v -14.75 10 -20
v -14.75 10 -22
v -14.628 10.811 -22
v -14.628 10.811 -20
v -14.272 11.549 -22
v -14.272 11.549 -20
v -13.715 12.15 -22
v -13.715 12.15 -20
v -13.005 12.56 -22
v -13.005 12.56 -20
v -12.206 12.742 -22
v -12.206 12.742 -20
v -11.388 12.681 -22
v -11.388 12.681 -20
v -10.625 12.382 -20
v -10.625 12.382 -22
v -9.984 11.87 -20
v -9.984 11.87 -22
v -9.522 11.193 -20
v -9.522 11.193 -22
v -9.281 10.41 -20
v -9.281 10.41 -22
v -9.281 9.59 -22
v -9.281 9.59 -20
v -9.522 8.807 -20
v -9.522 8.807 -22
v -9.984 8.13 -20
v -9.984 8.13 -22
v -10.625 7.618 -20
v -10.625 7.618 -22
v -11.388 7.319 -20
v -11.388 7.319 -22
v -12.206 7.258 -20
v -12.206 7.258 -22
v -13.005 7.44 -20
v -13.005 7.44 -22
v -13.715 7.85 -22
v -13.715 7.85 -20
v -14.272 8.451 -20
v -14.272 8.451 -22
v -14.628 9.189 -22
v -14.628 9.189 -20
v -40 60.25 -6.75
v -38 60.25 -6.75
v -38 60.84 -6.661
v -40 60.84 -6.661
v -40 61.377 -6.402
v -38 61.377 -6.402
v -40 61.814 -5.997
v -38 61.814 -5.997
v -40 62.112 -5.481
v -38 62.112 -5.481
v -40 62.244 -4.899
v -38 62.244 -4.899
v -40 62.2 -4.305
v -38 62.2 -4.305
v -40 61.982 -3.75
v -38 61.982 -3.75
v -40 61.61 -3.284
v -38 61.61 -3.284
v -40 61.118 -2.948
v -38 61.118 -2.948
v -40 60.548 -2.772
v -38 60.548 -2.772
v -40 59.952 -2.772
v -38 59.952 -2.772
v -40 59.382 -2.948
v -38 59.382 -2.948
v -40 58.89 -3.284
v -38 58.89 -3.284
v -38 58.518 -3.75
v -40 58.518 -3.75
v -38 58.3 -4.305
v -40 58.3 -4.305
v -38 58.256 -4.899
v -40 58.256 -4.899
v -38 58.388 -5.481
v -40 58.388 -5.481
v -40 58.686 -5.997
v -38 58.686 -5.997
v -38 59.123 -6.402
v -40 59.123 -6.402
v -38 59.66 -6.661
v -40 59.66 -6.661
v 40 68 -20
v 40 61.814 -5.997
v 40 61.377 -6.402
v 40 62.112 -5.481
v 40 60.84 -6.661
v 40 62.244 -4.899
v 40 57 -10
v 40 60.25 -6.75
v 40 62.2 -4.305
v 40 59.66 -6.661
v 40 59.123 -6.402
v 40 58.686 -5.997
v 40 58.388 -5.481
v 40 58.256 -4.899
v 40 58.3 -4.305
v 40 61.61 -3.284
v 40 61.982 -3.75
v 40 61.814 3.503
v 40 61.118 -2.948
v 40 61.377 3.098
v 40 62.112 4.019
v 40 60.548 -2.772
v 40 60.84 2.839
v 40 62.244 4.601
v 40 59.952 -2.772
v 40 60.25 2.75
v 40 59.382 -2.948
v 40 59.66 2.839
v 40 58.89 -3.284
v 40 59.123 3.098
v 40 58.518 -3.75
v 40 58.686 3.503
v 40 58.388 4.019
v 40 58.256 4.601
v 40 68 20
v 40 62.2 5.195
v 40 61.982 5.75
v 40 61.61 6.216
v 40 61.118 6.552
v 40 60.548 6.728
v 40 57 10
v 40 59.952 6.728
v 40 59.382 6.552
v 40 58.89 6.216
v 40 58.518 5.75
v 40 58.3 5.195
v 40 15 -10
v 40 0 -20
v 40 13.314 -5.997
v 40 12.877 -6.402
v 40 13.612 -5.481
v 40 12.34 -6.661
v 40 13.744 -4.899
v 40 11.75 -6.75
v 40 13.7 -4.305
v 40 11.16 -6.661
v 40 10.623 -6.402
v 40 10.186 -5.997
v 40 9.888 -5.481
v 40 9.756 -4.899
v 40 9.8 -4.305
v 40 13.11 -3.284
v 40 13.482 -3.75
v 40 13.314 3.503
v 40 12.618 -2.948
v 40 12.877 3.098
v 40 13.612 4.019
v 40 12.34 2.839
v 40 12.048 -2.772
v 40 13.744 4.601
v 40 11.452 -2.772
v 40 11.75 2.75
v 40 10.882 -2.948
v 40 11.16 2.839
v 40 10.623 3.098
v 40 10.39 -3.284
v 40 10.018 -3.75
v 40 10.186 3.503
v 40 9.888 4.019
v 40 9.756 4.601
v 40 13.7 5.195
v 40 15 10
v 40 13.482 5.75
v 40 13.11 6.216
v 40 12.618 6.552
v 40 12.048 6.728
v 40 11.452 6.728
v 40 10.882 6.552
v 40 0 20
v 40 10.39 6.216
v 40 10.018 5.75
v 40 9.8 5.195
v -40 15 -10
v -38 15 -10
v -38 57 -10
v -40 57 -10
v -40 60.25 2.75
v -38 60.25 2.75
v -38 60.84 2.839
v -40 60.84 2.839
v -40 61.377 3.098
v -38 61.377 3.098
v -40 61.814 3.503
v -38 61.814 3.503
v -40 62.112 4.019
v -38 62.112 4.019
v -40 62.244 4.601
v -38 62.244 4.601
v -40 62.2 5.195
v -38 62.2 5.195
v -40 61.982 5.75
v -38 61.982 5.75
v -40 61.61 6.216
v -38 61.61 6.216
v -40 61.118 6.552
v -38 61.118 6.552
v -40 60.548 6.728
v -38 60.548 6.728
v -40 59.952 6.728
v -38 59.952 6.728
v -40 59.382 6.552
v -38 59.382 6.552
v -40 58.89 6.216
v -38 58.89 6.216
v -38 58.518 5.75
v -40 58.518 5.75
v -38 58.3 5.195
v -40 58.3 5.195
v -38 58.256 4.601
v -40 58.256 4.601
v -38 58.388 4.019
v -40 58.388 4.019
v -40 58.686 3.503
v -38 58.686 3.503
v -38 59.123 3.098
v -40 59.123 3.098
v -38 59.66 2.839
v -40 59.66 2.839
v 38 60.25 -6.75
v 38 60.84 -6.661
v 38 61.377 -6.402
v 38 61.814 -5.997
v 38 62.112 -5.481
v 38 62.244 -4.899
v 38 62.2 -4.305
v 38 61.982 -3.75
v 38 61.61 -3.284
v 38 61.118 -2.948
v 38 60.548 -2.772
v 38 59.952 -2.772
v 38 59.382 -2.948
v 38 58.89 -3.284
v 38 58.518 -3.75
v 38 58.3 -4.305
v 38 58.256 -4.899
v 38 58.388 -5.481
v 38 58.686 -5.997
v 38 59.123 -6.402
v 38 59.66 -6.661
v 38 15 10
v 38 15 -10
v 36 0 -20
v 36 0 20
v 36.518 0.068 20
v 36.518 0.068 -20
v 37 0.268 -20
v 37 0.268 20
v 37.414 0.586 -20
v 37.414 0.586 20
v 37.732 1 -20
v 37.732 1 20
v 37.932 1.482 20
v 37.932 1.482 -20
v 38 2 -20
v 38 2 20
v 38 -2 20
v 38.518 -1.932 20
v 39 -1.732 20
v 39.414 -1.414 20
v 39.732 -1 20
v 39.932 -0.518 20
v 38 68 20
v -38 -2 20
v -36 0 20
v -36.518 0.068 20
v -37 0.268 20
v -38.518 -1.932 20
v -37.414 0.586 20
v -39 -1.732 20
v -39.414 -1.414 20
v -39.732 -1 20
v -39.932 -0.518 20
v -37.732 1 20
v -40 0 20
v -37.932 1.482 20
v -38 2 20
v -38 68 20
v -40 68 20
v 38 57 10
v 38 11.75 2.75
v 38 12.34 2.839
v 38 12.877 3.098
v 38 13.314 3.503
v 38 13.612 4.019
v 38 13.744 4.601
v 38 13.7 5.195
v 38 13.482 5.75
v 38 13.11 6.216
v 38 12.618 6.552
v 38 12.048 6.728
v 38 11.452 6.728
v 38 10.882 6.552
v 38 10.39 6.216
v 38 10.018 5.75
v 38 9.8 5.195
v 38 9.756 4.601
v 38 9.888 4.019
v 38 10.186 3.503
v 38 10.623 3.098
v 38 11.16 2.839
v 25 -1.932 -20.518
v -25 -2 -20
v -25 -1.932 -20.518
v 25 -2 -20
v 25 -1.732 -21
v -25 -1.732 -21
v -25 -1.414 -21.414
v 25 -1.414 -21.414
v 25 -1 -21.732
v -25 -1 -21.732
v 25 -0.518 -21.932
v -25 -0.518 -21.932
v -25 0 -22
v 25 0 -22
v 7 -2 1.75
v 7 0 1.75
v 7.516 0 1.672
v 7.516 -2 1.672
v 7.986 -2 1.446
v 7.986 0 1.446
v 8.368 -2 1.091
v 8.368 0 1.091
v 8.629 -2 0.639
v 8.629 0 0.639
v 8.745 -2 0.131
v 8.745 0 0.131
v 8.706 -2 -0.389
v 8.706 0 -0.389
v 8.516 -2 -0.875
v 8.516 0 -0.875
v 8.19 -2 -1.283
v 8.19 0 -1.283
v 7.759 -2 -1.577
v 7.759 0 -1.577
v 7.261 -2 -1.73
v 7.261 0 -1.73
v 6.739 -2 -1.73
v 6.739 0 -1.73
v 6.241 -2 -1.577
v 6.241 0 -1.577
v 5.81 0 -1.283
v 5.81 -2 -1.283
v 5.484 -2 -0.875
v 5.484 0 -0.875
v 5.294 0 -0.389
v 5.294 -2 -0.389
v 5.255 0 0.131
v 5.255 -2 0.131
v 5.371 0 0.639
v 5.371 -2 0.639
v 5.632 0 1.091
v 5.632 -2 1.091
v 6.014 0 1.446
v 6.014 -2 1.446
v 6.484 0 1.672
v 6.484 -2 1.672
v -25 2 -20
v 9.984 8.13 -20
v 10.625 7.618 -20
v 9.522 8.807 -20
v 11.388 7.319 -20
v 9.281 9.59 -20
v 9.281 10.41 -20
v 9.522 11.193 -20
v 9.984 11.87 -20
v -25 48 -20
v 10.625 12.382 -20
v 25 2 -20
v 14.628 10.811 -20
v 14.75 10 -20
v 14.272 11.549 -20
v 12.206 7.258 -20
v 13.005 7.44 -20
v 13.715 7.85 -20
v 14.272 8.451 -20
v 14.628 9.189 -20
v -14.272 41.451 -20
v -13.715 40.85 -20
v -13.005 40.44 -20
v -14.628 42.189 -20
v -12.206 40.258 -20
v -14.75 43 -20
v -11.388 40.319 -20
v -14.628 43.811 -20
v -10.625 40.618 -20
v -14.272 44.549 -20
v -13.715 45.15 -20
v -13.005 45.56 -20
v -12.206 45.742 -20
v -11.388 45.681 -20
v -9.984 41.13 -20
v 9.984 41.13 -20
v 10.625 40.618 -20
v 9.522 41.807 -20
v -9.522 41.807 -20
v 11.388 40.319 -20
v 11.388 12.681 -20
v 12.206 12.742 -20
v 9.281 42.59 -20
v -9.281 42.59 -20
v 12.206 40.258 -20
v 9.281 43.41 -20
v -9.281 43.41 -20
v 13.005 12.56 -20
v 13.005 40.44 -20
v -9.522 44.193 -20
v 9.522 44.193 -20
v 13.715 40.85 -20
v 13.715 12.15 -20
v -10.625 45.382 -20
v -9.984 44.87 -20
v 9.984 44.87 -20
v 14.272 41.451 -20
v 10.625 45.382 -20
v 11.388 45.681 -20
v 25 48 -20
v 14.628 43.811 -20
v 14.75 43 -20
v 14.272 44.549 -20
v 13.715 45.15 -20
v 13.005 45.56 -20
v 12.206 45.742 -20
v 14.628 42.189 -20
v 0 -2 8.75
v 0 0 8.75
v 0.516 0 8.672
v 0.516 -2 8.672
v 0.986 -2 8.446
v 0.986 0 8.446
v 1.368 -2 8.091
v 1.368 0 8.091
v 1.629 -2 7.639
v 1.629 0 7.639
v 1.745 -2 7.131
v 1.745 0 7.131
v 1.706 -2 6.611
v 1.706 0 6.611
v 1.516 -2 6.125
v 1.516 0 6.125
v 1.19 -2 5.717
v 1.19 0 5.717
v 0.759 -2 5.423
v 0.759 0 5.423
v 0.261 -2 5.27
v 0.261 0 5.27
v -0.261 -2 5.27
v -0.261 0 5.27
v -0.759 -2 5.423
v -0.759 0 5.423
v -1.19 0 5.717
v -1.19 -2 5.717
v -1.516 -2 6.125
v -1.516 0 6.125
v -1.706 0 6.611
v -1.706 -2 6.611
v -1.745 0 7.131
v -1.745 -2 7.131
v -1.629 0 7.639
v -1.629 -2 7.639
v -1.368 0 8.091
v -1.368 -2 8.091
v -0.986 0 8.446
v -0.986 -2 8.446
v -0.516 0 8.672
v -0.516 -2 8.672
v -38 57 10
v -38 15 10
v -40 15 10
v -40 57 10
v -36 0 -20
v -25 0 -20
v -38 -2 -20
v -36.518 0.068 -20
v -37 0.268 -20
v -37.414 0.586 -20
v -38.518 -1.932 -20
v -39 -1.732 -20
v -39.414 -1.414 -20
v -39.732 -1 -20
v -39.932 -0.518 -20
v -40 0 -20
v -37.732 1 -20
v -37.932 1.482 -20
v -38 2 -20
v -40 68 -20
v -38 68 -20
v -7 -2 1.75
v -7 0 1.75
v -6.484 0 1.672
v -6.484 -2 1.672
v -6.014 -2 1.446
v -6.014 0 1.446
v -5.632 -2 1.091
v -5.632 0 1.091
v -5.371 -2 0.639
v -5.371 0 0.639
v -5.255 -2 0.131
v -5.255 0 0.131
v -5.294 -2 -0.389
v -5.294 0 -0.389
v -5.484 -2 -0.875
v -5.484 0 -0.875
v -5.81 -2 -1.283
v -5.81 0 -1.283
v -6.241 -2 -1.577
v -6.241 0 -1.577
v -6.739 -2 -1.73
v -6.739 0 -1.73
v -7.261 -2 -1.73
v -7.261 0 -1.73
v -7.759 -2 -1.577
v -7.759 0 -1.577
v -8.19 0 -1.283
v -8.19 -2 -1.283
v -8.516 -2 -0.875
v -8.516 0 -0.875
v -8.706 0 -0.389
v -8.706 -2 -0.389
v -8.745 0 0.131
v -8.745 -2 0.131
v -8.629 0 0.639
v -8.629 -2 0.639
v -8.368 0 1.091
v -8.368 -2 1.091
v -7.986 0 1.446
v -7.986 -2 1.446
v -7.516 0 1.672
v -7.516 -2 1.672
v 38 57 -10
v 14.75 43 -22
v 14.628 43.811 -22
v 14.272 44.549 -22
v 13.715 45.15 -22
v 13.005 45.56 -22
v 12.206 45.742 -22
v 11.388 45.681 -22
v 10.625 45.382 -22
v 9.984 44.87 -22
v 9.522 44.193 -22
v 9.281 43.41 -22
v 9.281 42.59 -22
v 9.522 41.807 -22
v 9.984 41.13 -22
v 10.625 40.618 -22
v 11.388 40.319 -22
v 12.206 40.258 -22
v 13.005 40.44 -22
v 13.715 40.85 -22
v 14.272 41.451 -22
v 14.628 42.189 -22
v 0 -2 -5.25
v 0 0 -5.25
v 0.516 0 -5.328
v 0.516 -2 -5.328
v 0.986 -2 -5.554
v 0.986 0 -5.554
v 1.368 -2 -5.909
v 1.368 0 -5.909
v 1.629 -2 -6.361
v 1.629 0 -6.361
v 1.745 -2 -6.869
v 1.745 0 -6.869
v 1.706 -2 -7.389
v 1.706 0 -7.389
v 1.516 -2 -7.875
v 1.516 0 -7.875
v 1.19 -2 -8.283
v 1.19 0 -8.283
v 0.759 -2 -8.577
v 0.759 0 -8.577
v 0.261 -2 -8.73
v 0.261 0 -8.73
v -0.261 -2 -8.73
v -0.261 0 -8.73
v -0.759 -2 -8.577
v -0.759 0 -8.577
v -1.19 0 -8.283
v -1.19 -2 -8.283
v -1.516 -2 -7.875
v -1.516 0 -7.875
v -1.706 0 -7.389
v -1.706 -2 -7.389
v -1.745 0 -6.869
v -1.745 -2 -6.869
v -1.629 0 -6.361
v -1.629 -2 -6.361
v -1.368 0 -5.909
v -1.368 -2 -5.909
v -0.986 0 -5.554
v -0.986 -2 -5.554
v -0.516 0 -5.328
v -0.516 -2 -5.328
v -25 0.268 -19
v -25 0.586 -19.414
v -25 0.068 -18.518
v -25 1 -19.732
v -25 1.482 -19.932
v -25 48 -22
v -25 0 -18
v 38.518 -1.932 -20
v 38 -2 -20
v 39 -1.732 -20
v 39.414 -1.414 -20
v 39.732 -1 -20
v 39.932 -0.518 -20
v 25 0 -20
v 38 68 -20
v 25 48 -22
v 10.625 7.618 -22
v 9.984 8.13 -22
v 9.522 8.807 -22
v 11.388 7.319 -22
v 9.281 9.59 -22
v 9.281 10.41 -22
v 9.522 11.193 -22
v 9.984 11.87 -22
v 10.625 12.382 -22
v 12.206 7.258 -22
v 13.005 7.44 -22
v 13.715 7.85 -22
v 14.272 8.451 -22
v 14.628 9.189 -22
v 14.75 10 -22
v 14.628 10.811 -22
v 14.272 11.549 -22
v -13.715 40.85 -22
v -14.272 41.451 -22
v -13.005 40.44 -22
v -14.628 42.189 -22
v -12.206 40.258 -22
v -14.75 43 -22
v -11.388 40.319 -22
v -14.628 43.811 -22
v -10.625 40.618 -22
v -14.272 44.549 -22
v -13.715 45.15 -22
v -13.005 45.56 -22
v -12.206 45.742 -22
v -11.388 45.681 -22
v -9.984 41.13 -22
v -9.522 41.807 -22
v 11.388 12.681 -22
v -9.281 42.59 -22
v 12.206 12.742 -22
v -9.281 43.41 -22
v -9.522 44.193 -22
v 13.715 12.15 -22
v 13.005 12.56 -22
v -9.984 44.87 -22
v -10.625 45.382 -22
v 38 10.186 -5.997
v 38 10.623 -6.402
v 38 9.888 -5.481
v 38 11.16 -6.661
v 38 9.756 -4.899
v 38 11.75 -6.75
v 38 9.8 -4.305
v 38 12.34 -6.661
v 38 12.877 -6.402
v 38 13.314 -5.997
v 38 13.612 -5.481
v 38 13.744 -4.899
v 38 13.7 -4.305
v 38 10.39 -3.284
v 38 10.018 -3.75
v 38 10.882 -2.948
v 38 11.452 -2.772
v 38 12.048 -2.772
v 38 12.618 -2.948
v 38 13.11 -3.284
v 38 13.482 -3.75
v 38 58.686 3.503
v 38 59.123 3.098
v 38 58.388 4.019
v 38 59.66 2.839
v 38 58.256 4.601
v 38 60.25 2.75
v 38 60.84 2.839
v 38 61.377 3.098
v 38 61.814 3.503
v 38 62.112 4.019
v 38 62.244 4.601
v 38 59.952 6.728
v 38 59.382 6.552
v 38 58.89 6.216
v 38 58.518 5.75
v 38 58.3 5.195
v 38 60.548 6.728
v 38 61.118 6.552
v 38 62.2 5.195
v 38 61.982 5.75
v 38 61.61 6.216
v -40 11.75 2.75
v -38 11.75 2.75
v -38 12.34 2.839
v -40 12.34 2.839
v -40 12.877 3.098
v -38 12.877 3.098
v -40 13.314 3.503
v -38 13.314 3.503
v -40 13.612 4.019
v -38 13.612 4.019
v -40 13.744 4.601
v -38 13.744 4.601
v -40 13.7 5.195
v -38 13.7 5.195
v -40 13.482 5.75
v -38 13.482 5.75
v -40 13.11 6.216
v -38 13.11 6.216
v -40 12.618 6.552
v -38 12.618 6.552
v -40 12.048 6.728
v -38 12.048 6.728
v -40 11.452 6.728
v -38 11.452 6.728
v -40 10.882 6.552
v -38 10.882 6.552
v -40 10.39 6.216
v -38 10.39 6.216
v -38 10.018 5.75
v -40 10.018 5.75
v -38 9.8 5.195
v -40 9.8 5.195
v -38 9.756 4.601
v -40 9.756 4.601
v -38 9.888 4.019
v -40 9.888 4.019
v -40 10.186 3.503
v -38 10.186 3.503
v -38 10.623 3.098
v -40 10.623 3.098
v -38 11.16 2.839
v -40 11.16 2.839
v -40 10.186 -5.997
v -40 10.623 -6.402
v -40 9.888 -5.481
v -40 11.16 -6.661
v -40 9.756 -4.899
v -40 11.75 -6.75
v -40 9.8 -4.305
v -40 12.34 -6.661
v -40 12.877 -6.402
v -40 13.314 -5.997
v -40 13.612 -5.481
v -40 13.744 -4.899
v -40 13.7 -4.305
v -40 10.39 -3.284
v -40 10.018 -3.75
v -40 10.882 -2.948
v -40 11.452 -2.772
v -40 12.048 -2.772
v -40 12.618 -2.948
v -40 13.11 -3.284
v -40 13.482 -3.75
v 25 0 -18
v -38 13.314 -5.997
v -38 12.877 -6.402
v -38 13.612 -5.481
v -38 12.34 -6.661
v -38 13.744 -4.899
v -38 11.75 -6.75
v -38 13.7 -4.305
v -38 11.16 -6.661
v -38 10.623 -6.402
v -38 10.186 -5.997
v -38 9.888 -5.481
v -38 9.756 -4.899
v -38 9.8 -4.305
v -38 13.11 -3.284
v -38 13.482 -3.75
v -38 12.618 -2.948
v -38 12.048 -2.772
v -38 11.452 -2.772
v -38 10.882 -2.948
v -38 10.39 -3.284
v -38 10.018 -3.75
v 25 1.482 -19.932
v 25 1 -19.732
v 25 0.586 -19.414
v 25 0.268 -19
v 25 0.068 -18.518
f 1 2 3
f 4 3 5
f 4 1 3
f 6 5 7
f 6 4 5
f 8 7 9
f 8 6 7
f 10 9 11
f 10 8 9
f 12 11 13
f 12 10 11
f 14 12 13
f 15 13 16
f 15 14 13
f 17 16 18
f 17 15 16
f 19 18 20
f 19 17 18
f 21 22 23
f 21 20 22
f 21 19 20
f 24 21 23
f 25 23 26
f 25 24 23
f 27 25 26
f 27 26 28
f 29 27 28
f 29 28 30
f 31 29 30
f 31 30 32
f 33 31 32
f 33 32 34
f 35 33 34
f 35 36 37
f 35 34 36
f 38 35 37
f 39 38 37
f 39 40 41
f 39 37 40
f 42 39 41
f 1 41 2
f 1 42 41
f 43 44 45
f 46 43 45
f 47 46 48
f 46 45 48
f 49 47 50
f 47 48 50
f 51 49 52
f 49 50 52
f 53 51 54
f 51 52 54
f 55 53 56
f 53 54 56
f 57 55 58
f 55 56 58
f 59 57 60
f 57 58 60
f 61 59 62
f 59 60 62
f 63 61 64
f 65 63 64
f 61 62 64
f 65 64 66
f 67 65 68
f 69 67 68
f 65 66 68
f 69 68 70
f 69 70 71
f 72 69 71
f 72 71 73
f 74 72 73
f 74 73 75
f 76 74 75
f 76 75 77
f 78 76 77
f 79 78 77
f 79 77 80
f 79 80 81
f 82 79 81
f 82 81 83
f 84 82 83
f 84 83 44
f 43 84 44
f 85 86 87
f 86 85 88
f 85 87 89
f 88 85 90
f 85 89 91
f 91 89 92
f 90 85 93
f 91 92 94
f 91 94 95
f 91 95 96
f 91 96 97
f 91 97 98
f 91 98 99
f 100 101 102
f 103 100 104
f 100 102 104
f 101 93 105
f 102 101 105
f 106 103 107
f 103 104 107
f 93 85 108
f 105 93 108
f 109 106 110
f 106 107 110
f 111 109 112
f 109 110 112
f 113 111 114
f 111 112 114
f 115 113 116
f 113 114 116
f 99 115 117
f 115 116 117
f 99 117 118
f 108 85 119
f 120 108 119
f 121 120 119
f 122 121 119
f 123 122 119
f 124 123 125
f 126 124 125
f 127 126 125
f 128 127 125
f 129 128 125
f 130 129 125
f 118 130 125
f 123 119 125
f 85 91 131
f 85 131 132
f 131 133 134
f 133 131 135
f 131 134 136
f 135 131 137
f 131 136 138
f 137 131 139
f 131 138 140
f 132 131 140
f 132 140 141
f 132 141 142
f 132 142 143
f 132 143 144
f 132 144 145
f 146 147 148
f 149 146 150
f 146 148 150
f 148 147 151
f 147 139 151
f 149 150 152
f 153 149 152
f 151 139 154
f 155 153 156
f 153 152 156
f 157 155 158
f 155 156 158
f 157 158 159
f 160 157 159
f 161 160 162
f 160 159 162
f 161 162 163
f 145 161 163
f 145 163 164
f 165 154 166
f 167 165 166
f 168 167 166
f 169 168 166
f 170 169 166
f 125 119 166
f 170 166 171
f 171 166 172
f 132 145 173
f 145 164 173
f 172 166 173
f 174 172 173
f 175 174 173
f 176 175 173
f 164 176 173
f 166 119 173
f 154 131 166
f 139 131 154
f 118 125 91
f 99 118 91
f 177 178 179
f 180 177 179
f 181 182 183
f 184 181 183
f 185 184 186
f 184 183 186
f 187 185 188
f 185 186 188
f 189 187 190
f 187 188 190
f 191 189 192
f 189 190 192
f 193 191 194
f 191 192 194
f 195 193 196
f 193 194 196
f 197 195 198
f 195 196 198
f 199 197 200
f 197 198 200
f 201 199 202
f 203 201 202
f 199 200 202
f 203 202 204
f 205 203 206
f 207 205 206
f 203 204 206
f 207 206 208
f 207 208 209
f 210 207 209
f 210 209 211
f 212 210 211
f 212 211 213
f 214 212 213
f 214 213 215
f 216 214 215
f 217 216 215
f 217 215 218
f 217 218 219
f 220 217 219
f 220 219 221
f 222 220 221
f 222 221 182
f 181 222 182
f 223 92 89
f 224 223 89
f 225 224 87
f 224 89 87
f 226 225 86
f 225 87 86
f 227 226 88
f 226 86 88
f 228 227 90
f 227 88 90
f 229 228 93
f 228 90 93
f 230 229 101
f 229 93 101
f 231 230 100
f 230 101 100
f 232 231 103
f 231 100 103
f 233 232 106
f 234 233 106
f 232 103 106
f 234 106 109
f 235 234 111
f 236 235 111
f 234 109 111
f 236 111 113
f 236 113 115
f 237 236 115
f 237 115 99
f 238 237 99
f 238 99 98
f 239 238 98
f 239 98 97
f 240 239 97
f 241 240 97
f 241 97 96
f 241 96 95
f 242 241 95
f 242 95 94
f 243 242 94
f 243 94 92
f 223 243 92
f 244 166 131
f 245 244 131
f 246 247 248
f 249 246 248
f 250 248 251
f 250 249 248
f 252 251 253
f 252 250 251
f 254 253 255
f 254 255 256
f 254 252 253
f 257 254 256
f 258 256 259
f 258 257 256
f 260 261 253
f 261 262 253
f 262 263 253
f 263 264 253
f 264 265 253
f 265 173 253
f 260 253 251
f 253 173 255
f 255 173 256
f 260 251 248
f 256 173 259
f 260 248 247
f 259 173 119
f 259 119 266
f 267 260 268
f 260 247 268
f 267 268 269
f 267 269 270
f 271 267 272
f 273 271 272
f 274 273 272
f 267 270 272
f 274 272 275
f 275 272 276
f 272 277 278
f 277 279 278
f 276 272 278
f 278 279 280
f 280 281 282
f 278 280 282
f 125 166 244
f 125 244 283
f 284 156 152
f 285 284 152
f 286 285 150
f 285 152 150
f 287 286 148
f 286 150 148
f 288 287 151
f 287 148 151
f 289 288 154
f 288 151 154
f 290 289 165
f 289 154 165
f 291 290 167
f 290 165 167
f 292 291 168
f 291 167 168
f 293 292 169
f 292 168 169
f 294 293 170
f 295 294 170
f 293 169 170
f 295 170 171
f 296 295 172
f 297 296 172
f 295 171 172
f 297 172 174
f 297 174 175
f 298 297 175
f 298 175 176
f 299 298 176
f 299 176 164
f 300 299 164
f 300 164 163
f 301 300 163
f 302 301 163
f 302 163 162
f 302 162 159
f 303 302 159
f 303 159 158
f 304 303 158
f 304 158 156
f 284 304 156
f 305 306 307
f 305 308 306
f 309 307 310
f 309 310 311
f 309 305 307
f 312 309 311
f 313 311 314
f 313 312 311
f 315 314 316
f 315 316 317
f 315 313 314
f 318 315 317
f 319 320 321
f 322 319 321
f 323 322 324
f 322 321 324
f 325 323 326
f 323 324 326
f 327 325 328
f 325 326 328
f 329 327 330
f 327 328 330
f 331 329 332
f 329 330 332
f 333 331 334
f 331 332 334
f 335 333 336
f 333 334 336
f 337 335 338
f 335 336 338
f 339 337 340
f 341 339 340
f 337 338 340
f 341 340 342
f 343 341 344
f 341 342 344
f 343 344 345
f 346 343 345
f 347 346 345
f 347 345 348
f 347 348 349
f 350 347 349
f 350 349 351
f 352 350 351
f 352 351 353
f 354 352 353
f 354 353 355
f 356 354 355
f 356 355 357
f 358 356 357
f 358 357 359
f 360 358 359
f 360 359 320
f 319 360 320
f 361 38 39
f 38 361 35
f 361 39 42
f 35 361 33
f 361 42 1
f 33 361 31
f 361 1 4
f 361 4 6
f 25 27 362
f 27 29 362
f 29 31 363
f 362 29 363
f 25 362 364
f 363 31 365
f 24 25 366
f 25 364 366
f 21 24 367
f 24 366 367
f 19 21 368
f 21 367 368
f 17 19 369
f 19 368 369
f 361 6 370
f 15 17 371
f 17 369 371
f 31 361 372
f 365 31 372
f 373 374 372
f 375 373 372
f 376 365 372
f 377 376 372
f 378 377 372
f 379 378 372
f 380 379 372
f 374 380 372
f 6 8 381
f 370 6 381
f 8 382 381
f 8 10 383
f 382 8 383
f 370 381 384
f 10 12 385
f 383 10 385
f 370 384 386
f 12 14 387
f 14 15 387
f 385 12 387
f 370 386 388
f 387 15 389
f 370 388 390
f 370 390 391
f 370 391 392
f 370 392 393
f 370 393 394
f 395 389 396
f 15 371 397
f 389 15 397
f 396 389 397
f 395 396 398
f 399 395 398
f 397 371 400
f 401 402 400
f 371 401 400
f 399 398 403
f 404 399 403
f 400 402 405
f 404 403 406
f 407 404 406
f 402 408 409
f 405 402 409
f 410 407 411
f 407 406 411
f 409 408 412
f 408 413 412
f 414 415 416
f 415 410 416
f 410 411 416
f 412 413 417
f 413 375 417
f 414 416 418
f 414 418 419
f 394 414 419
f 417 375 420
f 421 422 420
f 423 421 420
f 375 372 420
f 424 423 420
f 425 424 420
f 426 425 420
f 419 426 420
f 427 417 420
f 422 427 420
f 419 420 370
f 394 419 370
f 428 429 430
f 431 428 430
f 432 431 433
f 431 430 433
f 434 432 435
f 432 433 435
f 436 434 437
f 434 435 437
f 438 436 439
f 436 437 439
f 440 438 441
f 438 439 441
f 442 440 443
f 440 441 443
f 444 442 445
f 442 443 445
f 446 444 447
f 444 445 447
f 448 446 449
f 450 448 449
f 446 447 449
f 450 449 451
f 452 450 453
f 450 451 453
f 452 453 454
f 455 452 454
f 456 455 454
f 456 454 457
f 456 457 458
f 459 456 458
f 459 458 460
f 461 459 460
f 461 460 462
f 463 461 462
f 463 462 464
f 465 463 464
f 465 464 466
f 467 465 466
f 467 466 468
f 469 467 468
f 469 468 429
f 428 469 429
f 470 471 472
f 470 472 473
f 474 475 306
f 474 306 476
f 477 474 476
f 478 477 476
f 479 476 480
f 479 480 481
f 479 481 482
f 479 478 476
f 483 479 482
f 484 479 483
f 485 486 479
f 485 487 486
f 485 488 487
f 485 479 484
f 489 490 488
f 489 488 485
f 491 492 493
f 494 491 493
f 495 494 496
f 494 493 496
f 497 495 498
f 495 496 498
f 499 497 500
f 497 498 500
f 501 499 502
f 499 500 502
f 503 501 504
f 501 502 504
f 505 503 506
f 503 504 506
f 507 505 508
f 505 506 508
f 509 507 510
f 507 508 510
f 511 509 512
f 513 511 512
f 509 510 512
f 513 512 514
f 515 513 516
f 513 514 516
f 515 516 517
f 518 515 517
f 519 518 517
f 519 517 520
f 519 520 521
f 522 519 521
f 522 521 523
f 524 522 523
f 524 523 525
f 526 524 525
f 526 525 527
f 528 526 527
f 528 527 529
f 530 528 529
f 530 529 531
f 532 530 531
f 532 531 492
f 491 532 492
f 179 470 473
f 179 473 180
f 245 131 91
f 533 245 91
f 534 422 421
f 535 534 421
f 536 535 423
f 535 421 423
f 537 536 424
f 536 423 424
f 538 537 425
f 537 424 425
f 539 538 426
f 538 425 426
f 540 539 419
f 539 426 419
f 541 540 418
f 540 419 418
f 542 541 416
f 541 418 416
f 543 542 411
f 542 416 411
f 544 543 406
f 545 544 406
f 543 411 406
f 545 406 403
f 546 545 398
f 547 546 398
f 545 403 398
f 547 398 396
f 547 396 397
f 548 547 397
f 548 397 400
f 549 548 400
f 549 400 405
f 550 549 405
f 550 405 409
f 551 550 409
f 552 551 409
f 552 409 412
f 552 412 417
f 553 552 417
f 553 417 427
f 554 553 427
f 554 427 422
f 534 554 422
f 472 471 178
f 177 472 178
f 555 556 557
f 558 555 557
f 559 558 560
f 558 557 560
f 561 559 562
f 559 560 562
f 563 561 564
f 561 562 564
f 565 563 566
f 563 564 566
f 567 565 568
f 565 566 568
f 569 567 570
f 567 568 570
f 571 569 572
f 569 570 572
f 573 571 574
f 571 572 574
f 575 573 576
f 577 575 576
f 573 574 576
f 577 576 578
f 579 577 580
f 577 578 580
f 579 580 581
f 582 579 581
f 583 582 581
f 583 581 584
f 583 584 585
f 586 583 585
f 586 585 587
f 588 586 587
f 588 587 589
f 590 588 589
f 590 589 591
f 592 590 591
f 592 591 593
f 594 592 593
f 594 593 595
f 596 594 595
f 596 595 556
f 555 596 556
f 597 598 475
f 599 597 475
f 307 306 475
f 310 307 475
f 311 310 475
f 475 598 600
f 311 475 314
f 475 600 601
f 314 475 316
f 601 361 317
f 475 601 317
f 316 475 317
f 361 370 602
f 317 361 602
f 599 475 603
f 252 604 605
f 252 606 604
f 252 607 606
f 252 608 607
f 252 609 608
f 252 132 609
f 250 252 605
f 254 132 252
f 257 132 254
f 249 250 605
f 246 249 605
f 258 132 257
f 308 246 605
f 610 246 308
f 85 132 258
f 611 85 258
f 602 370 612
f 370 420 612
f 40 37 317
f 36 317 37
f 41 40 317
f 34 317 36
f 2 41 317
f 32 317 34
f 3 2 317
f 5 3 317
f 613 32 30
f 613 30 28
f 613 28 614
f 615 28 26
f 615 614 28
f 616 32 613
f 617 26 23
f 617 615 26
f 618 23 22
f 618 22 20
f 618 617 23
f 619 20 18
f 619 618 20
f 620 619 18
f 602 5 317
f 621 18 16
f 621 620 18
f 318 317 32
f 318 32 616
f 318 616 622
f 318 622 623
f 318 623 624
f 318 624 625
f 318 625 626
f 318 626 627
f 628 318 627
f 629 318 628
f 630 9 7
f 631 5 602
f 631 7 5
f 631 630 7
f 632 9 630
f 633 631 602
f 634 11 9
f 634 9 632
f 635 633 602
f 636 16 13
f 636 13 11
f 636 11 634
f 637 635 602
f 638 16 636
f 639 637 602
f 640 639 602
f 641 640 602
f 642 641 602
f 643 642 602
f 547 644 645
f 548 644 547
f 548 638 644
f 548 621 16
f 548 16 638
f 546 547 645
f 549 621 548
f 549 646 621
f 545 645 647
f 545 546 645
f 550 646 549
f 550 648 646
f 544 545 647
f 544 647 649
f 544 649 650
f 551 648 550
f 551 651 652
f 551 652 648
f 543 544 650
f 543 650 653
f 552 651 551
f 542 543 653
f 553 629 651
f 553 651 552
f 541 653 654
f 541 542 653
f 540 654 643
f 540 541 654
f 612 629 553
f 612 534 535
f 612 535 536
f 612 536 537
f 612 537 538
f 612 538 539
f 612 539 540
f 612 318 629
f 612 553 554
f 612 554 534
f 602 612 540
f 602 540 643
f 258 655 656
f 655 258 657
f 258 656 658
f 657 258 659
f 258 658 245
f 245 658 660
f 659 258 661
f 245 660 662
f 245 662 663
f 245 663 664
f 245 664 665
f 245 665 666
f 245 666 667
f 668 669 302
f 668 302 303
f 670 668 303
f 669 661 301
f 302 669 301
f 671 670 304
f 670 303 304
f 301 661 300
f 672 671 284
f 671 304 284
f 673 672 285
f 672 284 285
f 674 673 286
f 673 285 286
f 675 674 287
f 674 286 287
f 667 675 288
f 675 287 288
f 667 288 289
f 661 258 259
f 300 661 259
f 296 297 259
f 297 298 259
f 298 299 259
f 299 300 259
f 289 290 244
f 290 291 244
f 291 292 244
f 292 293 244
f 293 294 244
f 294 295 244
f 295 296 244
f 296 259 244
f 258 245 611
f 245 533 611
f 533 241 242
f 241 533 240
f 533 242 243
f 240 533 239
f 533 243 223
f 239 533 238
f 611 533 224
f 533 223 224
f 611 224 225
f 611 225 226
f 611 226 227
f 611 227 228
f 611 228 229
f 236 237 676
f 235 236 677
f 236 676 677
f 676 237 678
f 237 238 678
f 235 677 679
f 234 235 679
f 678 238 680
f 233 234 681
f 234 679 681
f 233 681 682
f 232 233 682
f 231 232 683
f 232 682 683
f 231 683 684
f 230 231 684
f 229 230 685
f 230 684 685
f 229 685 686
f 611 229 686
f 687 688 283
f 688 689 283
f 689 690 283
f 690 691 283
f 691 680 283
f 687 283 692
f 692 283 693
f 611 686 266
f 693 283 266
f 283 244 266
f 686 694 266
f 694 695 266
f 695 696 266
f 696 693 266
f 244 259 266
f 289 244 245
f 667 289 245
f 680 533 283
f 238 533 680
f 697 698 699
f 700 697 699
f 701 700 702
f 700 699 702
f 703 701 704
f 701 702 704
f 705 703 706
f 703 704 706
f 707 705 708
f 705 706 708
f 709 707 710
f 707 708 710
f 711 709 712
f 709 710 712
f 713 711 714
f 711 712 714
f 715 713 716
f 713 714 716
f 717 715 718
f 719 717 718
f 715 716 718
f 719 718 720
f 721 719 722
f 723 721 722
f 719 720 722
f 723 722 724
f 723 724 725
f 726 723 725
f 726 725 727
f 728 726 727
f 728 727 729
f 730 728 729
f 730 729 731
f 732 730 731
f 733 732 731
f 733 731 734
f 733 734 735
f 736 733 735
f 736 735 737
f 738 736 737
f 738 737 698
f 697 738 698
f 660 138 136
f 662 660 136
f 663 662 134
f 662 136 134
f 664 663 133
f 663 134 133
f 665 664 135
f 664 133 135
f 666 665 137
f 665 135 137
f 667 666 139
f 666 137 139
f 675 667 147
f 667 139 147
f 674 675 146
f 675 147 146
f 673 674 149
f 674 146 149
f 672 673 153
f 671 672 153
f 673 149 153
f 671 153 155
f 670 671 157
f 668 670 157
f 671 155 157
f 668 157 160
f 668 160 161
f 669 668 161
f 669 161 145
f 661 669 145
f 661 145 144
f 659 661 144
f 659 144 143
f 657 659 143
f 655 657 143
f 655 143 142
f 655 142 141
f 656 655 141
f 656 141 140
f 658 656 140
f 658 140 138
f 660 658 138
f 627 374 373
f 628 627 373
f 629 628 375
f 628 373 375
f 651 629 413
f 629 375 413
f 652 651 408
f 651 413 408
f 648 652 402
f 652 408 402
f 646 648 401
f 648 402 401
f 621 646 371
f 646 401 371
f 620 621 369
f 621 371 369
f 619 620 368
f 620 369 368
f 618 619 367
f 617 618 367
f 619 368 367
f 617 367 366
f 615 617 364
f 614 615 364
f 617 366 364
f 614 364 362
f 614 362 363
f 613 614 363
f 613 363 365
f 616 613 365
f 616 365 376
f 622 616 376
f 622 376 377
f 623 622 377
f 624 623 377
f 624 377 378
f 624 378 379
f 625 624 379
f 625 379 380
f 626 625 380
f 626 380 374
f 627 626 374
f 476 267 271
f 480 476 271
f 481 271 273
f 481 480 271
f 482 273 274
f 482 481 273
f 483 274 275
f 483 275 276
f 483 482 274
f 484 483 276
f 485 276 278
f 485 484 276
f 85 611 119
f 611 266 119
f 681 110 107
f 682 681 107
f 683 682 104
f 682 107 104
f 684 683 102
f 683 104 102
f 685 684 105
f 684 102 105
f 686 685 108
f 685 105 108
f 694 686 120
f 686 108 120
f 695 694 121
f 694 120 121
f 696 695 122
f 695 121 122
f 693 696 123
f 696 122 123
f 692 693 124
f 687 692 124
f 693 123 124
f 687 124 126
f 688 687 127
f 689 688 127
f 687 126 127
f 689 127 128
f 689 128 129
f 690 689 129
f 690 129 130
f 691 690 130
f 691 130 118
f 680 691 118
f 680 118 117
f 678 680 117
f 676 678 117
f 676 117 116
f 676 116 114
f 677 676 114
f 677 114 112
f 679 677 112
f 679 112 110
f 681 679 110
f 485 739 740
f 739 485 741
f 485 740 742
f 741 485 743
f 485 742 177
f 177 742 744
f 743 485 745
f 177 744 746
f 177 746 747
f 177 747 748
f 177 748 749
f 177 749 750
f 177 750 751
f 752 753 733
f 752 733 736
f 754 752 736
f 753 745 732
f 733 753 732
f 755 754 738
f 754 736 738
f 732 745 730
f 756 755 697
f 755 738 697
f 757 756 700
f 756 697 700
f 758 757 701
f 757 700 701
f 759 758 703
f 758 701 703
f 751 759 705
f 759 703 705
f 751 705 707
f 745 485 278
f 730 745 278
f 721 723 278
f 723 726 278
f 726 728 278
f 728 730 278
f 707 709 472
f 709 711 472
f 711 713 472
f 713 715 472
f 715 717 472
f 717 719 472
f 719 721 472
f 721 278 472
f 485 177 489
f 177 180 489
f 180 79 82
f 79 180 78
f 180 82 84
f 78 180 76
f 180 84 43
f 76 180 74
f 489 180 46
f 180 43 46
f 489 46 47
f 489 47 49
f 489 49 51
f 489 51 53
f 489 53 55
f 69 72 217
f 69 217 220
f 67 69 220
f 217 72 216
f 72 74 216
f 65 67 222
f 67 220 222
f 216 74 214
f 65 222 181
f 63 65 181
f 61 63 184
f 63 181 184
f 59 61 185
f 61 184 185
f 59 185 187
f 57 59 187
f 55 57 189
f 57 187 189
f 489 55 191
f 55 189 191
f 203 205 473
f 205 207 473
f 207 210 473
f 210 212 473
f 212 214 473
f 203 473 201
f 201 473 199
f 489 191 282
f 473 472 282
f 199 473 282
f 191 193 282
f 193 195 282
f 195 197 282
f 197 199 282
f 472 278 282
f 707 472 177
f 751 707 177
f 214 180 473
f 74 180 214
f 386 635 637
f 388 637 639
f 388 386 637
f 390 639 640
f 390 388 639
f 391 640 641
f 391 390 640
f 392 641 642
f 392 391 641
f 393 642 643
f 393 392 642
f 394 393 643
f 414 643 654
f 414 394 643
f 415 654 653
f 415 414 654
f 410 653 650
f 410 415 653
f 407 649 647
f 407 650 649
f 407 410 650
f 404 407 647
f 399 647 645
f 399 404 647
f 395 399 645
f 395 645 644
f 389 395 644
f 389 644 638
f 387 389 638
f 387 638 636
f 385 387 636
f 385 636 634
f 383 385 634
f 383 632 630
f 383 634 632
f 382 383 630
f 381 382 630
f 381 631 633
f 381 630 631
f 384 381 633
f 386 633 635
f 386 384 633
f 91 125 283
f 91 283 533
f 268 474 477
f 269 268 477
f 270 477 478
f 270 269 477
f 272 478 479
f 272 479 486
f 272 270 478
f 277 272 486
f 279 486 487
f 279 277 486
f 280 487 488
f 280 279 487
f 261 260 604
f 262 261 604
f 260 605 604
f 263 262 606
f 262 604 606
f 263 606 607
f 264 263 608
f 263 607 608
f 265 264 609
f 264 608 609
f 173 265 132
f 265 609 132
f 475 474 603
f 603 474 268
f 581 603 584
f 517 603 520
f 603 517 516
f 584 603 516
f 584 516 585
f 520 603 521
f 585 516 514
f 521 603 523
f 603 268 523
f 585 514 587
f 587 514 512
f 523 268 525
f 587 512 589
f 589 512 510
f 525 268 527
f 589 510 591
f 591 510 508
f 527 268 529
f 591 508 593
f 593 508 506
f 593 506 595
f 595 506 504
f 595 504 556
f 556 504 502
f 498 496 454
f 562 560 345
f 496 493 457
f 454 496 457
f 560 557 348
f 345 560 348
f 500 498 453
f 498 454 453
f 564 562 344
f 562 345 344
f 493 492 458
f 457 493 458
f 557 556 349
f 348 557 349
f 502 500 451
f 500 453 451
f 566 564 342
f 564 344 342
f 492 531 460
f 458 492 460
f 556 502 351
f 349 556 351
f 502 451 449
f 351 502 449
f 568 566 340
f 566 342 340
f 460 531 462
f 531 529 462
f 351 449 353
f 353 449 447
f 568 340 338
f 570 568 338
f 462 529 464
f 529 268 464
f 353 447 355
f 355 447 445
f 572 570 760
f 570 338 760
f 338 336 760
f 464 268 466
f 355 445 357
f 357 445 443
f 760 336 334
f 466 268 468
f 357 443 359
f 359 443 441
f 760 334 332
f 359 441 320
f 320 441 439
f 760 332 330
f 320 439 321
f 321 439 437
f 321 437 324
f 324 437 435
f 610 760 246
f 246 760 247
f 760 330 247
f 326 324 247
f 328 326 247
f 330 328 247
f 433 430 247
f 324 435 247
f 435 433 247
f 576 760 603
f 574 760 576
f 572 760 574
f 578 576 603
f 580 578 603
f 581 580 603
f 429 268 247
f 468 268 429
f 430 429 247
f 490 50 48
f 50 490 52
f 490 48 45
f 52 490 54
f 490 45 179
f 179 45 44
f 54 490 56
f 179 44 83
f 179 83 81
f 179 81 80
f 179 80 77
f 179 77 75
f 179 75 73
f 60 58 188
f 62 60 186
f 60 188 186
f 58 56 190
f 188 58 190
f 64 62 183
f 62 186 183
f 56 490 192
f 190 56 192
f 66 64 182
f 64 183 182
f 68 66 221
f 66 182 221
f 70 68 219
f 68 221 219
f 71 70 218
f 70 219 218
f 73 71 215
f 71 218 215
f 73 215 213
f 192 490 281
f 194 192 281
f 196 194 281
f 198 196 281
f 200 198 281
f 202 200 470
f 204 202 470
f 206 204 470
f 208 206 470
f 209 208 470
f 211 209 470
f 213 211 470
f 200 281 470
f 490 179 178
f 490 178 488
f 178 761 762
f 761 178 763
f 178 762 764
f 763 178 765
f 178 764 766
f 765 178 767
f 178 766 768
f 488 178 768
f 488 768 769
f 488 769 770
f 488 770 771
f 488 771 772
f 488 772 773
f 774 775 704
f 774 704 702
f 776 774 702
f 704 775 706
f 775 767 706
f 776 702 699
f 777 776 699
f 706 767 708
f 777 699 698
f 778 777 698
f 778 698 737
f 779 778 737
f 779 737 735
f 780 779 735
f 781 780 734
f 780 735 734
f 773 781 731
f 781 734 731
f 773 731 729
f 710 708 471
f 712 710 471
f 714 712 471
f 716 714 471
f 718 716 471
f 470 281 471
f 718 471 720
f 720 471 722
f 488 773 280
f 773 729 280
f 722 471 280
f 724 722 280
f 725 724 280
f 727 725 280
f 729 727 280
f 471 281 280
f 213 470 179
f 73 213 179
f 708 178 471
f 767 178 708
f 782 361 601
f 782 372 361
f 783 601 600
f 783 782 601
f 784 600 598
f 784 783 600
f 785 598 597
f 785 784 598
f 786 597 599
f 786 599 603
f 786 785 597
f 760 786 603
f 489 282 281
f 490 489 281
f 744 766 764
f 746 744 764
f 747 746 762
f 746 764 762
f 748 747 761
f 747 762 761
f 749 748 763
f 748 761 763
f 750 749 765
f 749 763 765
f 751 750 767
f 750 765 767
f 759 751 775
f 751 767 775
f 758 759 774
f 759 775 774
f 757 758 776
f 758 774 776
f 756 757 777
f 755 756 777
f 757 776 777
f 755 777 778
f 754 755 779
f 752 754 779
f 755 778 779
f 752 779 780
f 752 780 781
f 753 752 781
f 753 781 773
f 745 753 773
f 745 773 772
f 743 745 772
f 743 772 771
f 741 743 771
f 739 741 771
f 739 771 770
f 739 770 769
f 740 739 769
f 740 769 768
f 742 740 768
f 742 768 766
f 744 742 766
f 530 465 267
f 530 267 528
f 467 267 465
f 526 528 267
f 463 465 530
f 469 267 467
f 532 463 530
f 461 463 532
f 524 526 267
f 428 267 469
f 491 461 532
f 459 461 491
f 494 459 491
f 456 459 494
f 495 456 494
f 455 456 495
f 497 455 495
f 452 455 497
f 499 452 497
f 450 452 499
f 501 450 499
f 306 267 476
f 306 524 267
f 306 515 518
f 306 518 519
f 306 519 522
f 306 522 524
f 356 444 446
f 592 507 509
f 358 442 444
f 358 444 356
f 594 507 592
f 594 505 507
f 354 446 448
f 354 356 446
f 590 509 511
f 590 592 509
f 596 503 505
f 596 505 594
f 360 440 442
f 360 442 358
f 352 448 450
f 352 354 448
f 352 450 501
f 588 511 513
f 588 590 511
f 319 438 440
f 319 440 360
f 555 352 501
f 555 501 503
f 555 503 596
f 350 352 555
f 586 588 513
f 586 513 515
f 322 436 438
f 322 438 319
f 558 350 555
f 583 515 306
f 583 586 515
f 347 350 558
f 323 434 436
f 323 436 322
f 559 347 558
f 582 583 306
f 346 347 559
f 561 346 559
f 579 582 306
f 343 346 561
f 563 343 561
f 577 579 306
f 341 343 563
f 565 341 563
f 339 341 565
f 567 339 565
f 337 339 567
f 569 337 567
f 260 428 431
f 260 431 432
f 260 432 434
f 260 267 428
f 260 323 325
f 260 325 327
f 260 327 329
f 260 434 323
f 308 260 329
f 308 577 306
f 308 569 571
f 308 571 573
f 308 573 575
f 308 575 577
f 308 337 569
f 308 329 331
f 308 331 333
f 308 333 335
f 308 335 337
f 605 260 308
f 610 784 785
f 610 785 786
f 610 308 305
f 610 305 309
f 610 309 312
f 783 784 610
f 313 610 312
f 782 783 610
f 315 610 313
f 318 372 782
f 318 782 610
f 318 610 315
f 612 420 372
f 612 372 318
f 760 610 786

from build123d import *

# Parameters (mm, degrees)
EXTRUDE_1_DEPTH     = 20
SKETCH_2_R          = 1.75
CUT_EXTRUDE_1_DEPTH = 10
SKETCH_3_W          = 20
SKETCH_3_H          = 42
CUT_EXTRUDE_2_DEPTH = 107.883113727
SKETCH_4_R          = 2
CUT_EXTRUDE_3_DEPTH = 107.883113727
SKETCH_8_W          = 2
SKETCH_8_H          = 50
EXTRUDE_4_DEPTH     = 25
SKETCH_9_R          = 2.75
CUT_EXTRUDE_4_DEPTH = 8
FILLET_1_R          = 2


with BuildPart() as part:
    # 草图1 → 凸台-拉伸1 (new, symmetric)
    with BuildSketch(Plane.XY):
        Polygon((-38, 0), (38, 0), (38, 68), (40, 68), (40, -2), (-40, -2), (-40, 68), (-38, 68), align=None)
    extrude(amount=EXTRUDE_1_DEPTH, both=True)

    # 草图2 → 切除-拉伸1 (cut)
    with BuildSketch(Plane(origin=(0, 0, 0), x_dir=(1, 0, 0), z_dir=(0, 1, 0))):
        with Locations(Location((0, 7, 0), (0, 0, 270))):
            Circle(SKETCH_2_R)
        with Locations(Location((-7, 0, 0), (0, 0, 270))):
            Circle(SKETCH_2_R)
        with Locations(Location((0, -7, 0), (0, 0, 270))):
            Circle(SKETCH_2_R)
        with Locations(Location((7, 0, 0), (0, 0, 270))):
            Circle(SKETCH_2_R)
    extrude(amount=-CUT_EXTRUDE_1_DEPTH, mode=Mode.SUBTRACT)

    # 草图3 → 切除-拉伸2 (cut, through all)
    with BuildSketch(Plane(origin=(40, 0, 0), x_dir=(0, 0, -1), z_dir=(1, 0, 0))):
        with Locations((0, 36)):
            Rectangle(SKETCH_3_W, SKETCH_3_H)
    extrude(amount=-CUT_EXTRUDE_2_DEPTH, mode=Mode.SUBTRACT)

    # 草图4 → 切除-拉伸3 (cut, through all)
    with BuildSketch(Plane(origin=(40, 0, 0), x_dir=(0, 0, -1), z_dir=(1, 0, 0))):
        with Locations((-4.75, 60.25)):
            Circle(SKETCH_4_R)
        with Locations((4.75, 60.25)):
            Circle(SKETCH_4_R)
        with Locations((-4.75, 11.75)):
            Circle(SKETCH_4_R)
        with Locations((4.75, 11.75)):
            Circle(SKETCH_4_R)
    extrude(amount=-CUT_EXTRUDE_3_DEPTH, mode=Mode.SUBTRACT)

    # 草图8 → 凸台-拉伸4 (add, symmetric)
    with BuildSketch(Plane(origin=(0, 0, 0), x_dir=(0, 0, -1), z_dir=(1, 0, 0))):
        with Locations((21, 23)):
            Rectangle(SKETCH_8_W, SKETCH_8_H)
    extrude(amount=EXTRUDE_4_DEPTH, both=True)

    # 草图9 → 切除-拉伸4 (cut)
    with BuildSketch(Plane.XY.offset(-20)):
        with Locations((12, 10)):
            Circle(SKETCH_9_R)
        with Locations((12, 43)):
            Circle(SKETCH_9_R)
    cut_extrude_4 = extrude(amount=-CUT_EXTRUDE_4_DEPTH, mode=Mode.SUBTRACT)

    # 镜向1: 切除-拉伸4 across plane
    add(cut_extrude_4.mirror(Plane(origin=(0, 0, 0), x_dir=(0, 0, 1), z_dir=(1, 0, 0))), mode=Mode.SUBTRACT)

    # 圆角1
    fillet_1_edges = [part.edges().sort_by_distance(p)[0] for p in [
        (0, -2, -22),
        (0, 0, -20),
        (-38, 0, 0),
        (-40, -2, 0),
        (40, -2, 0),
        (38, 0, 0),
    ]]
    fillet(fillet_1_edges, radius=FILLET_1_R)


solid = part.part
